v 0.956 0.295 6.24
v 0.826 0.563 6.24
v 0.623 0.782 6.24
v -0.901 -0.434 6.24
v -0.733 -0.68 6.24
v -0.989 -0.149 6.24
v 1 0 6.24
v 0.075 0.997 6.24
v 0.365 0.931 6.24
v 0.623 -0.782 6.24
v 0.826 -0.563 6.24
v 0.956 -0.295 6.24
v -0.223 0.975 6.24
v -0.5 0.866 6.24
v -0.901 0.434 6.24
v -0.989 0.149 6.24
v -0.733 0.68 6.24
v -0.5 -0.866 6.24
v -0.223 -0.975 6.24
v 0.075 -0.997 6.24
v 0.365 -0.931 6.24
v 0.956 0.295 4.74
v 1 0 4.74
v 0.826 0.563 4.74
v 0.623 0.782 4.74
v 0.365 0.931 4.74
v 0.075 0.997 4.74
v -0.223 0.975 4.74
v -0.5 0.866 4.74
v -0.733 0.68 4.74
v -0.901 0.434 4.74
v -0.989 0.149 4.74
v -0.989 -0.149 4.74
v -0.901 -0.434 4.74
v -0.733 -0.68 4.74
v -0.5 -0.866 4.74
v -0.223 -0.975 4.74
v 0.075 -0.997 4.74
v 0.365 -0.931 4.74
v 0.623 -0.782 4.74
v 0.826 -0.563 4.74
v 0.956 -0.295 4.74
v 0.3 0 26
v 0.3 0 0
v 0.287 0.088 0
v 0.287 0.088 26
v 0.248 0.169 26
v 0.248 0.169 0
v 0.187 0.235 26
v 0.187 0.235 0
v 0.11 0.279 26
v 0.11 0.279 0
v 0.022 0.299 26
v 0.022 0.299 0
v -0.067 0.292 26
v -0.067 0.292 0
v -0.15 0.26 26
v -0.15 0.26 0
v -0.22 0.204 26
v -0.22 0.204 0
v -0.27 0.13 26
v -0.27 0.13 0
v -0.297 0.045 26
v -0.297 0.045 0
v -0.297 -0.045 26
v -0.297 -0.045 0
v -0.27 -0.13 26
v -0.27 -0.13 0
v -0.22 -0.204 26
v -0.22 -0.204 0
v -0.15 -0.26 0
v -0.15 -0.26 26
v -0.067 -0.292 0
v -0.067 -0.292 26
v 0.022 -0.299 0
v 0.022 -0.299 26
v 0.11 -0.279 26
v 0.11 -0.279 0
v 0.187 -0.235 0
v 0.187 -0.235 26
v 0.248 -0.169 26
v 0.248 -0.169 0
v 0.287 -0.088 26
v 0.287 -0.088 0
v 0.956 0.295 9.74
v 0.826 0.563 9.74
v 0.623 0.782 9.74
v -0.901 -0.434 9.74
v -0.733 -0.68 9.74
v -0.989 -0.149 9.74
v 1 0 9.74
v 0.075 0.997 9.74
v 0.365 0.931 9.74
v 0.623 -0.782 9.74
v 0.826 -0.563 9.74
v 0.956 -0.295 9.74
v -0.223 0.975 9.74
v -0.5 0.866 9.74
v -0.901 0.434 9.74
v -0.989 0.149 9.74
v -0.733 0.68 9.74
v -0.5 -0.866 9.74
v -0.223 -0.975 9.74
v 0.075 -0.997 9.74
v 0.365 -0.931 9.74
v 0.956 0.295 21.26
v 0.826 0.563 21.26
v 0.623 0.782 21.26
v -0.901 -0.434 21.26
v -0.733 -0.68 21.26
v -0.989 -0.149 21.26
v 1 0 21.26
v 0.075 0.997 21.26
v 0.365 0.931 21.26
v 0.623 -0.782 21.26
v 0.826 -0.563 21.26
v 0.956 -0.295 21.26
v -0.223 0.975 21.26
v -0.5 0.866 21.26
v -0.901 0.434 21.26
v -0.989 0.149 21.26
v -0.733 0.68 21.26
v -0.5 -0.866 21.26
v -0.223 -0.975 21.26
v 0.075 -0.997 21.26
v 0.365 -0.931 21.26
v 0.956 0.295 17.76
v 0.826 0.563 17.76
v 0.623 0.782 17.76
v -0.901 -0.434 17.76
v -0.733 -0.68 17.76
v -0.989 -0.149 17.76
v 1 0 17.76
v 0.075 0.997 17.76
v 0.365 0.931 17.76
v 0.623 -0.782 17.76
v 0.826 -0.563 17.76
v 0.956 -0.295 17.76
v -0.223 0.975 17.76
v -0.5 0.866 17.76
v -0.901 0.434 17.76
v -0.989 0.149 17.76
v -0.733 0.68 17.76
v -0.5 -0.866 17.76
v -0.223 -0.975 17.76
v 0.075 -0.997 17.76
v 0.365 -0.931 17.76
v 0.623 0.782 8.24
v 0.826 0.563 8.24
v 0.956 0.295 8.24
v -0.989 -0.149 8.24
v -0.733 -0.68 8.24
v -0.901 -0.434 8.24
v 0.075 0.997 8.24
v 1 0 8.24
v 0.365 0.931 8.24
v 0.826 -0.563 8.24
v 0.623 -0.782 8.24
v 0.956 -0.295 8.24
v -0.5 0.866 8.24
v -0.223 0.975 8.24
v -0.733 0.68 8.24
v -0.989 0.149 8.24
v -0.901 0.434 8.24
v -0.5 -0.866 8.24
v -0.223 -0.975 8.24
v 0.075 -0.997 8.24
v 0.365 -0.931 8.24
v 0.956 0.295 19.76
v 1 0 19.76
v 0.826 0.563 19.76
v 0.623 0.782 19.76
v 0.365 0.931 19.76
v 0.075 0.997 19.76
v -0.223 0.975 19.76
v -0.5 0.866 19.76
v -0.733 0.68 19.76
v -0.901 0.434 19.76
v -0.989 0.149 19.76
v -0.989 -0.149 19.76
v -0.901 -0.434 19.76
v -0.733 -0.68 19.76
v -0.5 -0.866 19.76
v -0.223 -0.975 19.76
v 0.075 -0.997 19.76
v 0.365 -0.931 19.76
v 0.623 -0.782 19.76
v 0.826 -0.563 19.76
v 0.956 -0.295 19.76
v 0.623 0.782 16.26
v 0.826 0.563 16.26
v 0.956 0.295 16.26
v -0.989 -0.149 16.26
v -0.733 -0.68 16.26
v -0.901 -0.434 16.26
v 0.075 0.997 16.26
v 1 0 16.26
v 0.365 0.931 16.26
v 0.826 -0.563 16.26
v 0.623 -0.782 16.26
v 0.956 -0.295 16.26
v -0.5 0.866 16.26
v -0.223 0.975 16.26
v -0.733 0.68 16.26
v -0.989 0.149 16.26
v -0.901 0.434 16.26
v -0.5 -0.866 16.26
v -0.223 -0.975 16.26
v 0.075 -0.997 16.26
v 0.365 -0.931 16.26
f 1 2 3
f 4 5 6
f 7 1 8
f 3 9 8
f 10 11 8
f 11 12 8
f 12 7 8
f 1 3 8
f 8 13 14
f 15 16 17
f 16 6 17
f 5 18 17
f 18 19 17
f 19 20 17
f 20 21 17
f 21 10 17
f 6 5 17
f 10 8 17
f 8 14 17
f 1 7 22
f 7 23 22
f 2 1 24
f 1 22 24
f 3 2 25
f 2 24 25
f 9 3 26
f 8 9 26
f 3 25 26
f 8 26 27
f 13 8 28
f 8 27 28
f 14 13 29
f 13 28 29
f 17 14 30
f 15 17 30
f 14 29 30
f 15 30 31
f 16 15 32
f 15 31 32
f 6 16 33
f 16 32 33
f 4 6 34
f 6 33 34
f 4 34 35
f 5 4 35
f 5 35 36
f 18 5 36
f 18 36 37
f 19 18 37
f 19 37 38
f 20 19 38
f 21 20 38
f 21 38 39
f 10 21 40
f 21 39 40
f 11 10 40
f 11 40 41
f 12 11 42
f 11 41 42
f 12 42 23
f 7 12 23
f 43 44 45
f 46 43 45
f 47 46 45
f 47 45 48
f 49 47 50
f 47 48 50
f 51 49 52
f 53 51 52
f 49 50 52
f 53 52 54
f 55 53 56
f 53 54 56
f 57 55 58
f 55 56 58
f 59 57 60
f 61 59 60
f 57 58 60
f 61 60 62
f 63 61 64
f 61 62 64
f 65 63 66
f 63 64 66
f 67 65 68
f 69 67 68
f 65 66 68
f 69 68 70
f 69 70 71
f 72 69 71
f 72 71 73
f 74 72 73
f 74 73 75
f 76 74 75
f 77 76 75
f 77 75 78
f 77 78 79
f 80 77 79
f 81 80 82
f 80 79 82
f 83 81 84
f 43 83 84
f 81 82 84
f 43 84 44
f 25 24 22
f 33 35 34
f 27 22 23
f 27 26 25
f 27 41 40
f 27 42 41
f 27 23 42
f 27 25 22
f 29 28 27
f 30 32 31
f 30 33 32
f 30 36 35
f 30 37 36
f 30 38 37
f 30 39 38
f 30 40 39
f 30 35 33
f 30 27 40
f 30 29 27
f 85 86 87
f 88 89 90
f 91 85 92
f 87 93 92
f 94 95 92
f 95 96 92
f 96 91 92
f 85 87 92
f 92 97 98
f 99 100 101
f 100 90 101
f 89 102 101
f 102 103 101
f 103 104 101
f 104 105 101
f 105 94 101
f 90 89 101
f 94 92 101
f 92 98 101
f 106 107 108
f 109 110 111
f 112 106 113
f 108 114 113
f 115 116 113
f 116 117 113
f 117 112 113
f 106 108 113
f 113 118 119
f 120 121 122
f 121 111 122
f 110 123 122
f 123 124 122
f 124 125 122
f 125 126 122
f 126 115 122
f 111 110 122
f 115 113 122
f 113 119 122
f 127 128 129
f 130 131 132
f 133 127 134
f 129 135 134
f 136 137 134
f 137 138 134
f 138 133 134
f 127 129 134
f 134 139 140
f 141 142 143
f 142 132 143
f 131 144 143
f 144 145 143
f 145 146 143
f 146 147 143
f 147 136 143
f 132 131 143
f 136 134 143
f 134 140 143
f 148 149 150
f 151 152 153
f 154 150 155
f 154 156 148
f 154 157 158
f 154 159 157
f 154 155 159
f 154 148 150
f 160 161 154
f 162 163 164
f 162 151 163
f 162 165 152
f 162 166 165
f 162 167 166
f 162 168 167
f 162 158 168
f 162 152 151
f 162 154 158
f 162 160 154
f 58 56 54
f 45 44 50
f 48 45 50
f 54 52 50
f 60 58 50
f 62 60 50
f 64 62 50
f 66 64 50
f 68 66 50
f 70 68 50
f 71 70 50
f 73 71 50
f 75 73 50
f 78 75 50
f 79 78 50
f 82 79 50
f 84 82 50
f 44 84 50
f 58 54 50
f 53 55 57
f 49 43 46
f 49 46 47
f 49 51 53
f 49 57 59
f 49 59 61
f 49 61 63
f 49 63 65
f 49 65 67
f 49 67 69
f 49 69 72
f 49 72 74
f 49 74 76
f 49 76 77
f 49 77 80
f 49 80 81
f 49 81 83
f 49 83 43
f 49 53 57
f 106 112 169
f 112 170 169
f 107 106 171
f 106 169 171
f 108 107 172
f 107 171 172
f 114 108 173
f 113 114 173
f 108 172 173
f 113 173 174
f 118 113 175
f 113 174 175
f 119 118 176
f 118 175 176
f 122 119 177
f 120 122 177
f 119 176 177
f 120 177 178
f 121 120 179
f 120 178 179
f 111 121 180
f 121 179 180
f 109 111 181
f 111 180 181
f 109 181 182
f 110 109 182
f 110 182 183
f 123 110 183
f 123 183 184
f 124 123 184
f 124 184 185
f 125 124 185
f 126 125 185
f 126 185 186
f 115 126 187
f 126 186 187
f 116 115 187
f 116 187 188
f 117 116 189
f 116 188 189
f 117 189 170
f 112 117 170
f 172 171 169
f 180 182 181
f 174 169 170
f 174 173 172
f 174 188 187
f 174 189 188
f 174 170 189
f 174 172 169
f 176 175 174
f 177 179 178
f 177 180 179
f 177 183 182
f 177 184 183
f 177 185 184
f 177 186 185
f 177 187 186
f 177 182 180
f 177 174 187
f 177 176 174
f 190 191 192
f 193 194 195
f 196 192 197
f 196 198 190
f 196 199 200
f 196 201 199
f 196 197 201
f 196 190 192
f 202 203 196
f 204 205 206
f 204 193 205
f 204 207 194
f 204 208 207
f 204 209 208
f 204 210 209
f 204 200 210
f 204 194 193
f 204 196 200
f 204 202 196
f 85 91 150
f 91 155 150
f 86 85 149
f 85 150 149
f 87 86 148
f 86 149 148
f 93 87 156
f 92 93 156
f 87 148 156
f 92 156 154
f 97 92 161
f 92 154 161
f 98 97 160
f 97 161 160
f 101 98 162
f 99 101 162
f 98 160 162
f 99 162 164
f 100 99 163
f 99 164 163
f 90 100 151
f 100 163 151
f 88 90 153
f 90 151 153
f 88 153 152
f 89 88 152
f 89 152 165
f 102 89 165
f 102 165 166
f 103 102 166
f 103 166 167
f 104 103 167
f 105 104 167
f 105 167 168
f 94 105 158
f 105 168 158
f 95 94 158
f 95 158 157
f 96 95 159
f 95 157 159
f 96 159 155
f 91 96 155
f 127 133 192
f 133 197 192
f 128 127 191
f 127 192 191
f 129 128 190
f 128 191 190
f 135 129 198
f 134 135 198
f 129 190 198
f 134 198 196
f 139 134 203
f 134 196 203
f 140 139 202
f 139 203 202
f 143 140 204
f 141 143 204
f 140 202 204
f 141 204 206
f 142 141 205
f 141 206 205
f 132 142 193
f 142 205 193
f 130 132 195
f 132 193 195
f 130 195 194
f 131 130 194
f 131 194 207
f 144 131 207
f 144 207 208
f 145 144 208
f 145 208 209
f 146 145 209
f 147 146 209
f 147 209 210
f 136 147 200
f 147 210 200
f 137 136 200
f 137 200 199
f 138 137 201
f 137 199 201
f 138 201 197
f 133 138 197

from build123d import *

# Parameters (mm, degrees)
SKETCH1_R           = 0.3
BOSS_EXTRUDE1_DEPTH = 26
SKETCH2_W           = 1
SKETCH2_H           = 1.5


with BuildPart() as part:
    # Sketch1 → Boss-Extrude1 (new body)
    with BuildSketch(Plane.XY):
        Circle(SKETCH1_R)
    extrude(amount=BOSS_EXTRUDE1_DEPTH)


with BuildPart() as body_2:
    # Sketch2 → Revolve1 (revolve)
    with BuildSketch(Plane(origin=(0, 0, 0), x_dir=(1, 0, 0), z_dir=(0, 1, 0))):
        with Locations((0.5, -5.49)):
            Rectangle(SKETCH2_W, SKETCH2_H)
        with Locations((0.5, -8.99)):
            Rectangle(SKETCH2_W, SKETCH2_H)
        with Locations((0.5, -20.51)):
            Rectangle(SKETCH2_W, SKETCH2_H)
        with Locations((0.5, -17.01)):
            Rectangle(SKETCH2_W, SKETCH2_H)
    revolve(axis=Axis((0, 0, 0), (0, 0, 1)))


solid = Compound([part.part, body_2.part])
